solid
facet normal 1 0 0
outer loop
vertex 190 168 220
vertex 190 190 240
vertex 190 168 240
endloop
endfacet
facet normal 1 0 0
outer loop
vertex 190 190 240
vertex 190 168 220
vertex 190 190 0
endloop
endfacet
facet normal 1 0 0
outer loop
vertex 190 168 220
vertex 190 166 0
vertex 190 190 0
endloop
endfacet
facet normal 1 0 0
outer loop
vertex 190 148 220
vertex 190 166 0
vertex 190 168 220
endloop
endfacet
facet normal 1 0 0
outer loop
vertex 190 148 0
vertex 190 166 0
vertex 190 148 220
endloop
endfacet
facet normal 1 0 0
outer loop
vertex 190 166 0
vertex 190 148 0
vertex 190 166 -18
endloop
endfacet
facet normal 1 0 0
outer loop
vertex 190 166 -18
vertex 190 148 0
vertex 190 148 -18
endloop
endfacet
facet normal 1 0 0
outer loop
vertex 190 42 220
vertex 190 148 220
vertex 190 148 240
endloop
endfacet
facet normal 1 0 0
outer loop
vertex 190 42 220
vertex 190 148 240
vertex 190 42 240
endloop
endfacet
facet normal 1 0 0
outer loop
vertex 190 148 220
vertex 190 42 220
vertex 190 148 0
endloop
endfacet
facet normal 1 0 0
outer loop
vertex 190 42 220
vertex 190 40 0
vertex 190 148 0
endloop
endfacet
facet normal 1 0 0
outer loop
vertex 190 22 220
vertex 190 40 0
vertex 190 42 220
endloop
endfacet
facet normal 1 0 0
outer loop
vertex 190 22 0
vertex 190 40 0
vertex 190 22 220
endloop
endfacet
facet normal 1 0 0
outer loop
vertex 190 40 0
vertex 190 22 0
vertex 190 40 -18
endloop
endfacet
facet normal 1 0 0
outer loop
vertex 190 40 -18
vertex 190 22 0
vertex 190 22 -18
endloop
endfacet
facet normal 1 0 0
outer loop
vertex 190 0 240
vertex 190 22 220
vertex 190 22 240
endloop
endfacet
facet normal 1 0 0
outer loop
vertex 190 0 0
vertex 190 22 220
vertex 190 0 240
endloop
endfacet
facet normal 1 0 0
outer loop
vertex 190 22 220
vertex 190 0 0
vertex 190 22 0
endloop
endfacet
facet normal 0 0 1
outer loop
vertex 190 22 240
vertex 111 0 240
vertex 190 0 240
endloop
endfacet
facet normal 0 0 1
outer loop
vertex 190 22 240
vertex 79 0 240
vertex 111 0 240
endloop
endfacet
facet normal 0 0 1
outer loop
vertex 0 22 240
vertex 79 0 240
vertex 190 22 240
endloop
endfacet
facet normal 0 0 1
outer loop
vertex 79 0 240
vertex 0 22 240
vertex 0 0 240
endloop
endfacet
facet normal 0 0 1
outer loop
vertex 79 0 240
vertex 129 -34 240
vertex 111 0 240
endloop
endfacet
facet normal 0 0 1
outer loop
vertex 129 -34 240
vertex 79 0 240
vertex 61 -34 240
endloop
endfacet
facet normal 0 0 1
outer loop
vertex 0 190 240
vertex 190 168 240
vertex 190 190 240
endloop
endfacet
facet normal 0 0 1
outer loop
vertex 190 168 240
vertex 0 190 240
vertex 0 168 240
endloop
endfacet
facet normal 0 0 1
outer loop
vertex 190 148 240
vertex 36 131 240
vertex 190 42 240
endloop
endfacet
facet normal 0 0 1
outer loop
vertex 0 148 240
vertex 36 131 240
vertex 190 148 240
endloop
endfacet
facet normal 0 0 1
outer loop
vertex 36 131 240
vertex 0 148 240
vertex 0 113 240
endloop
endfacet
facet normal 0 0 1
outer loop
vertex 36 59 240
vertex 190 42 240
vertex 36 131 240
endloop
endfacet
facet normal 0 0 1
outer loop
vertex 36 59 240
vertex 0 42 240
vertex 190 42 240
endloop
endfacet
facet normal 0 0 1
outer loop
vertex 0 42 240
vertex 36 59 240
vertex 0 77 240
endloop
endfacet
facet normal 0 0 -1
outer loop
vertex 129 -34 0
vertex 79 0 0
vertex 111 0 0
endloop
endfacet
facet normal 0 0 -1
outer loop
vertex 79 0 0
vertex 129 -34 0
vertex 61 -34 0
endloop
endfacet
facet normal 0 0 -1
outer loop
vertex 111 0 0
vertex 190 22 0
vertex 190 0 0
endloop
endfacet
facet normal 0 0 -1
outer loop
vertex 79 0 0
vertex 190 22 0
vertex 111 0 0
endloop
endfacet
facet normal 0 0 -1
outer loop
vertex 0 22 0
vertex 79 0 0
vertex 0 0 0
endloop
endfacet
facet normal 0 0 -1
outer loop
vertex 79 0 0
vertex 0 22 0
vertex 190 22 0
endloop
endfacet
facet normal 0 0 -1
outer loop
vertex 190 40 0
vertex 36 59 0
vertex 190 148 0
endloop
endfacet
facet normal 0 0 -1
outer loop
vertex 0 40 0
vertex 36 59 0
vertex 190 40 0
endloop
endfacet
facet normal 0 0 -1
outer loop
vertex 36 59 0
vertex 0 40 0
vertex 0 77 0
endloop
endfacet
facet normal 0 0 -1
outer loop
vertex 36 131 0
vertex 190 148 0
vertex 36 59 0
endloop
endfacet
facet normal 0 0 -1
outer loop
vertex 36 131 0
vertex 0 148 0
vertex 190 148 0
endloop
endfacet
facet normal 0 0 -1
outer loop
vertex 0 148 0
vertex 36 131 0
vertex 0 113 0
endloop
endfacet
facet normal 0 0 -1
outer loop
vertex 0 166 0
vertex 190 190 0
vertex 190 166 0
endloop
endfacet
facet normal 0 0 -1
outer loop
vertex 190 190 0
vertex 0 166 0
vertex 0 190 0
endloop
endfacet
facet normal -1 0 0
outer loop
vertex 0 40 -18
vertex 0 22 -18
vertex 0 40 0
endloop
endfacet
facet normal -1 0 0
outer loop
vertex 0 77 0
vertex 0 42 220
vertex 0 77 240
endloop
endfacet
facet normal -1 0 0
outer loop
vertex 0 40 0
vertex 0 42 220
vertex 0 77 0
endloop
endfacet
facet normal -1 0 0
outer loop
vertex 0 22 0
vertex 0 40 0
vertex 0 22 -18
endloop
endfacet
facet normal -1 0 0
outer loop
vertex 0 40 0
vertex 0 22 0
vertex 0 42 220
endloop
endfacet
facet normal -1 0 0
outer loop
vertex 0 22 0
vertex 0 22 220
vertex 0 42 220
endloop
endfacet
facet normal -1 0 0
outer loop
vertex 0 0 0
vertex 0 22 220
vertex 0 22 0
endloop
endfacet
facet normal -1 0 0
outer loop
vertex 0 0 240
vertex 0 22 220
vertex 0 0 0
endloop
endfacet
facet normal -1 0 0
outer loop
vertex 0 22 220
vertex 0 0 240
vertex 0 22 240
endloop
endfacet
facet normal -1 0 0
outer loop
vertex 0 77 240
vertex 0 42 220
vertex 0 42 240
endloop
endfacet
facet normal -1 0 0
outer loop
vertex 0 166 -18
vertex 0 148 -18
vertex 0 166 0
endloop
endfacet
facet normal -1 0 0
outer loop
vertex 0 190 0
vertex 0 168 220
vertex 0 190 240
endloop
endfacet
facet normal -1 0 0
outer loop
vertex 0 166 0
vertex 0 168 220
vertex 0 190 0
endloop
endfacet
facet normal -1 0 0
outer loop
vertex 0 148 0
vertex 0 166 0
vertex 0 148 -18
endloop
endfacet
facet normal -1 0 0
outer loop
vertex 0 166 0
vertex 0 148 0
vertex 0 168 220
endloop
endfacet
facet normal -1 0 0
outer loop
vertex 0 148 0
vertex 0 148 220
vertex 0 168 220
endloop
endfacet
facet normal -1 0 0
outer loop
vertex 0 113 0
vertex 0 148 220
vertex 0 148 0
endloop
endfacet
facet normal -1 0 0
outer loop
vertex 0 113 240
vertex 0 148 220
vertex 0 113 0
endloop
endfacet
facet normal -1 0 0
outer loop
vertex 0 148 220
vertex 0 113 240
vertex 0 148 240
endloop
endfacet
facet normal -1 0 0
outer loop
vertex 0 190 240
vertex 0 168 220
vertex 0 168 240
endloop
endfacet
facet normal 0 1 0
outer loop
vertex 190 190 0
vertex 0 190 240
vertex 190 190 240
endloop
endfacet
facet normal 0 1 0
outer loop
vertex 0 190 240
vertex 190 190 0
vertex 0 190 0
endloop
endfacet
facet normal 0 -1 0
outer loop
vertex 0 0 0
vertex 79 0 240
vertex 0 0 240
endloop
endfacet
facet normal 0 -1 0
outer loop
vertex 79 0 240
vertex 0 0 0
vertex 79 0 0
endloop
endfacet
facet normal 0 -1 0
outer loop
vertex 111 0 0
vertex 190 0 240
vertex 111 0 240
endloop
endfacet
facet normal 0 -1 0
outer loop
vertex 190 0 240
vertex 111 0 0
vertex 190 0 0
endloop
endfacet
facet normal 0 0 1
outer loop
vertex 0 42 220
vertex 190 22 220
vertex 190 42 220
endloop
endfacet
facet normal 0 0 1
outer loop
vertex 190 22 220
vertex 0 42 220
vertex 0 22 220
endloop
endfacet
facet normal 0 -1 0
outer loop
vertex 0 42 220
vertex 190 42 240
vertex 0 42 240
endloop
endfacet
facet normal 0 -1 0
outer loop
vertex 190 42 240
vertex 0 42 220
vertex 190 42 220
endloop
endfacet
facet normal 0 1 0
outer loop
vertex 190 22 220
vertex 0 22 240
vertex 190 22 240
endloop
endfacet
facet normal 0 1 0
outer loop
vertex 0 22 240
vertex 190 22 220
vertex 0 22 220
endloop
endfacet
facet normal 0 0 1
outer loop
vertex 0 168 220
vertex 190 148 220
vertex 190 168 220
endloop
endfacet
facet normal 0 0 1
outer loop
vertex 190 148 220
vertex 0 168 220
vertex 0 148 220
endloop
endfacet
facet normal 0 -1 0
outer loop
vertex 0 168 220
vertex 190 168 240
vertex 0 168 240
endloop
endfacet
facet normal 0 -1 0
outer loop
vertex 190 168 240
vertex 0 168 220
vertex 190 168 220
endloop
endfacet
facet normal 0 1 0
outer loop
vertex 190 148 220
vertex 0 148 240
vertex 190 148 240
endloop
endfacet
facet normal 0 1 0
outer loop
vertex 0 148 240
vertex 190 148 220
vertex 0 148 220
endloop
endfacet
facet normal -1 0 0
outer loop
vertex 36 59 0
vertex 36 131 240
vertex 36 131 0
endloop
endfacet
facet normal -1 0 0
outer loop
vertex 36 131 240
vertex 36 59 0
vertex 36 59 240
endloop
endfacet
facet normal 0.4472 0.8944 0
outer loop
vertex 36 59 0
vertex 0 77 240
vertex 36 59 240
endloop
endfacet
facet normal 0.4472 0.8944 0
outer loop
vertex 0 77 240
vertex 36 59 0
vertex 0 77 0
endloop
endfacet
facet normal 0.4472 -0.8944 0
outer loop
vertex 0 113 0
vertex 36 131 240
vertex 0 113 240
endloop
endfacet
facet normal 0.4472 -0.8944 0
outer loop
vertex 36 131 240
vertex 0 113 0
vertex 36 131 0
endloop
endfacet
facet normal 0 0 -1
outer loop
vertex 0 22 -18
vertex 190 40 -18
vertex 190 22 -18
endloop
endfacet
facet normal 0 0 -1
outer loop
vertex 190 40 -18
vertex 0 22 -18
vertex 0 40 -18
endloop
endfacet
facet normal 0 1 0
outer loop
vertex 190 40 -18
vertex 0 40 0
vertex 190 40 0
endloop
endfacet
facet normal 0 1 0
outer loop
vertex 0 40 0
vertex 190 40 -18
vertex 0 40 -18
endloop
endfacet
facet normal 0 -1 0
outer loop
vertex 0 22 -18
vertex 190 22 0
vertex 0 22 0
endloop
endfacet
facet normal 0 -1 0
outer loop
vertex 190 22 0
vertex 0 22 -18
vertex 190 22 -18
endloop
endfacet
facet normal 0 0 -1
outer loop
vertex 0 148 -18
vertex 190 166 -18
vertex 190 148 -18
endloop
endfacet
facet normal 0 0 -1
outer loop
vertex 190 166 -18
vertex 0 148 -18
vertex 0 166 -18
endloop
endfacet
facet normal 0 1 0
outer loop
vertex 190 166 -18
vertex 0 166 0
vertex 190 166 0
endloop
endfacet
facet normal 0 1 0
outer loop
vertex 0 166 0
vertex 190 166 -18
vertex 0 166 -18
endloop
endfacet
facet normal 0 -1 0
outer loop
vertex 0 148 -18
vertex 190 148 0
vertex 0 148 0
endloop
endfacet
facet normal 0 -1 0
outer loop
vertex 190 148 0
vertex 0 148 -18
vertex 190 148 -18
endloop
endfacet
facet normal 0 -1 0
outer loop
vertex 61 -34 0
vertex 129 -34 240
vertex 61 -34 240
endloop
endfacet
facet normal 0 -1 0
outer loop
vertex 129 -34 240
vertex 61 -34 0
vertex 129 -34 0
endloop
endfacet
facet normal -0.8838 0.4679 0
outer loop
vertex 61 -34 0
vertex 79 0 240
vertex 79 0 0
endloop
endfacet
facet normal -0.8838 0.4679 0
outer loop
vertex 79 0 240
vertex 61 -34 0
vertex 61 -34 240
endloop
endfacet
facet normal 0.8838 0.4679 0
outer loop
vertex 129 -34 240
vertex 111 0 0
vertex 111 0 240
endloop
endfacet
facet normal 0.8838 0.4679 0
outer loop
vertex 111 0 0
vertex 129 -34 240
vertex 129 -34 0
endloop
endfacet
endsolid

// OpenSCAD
FULL_BLOCK_WIDTH = 380;
HALF_BLOCK_WIDTH = 190;
BLOCK_HEIGHT = 240;
SMALL_BLOCK_DEPTH = 120;
MEDIUM_BLOCK_DEPTH = HALF_BLOCK_WIDTH;
HORIZONTAL_JOINT_SIZE = 20;
HORIZONTAL_JOINT_PADDING = 22;
VERTICAL_JOINT_STEP = 18;
FITTING = 2;

module vertical_joint_outer(block_height, vertical_joint_step, fitting) {
    linear_extrude(block_height) {
        polygon(points = [[0,vertical_joint_step + fitting],[vertical_joint_step*2 - fitting,fitting],[vertical_joint_step*2 - fitting,vertical_joint_step*4 - fitting],[0,vertical_joint_step*3 - fitting]]);
    }
}

module vertical_joint_inner(block_height, vertical_joint_step) {
    linear_extrude(block_height) {
        polygon(points = [[0,vertical_joint_step],[vertical_joint_step*2,0],[vertical_joint_step*2,vertical_joint_step*4],[0,vertical_joint_step*3]]);
    }
}

module horizontal_joint_inner(block_width, horizontal_joint_size) {
    cube([block_width,horizontal_joint_size,horizontal_joint_size],false);
}

module horizontal_joint_outer(block_width, horizontal_joint_size, fitting) {
    cube([block_width,horizontal_joint_size - fitting,horizontal_joint_size - fitting],false);
}


module brick(block_width, block_height, block_depth, horizontal_joint_size, horizontal_joint_padding, vertical_joint_step, fitting, start_joint, end_joint, side_joint) {

    difference() {
        cube([block_width,block_depth,block_height],false);
            translate([0,horizontal_joint_padding,block_height - horizontal_joint_size]) {
                horizontal_joint_inner(block_width, horizontal_joint_size);
            }
           
            translate([0,block_depth - horizontal_joint_padding- horizontal_joint_size,block_height-horizontal_joint_size]) {
                horizontal_joint_inner(block_width, horizontal_joint_size);
            }
            
            if (start_joint) {
                translate([0,(block_depth - vertical_joint_step*4)/2,0]) {
                    vertical_joint_inner(block_height, vertical_joint_step);
                }
            }
    }

    translate([0,horizontal_joint_padding, fitting - horizontal_joint_size]) {
        horizontal_joint_outer(block_width,horizontal_joint_size, fitting);
    }

    translate([0,block_depth - horizontal_joint_padding- horizontal_joint_size,fitting -horizontal_joint_size]) {
        horizontal_joint_outer(block_width,horizontal_joint_size, fitting);
    }

    if (end_joint) {
        translate([block_width,(block_depth - vertical_joint_step*4)/2,0]) {
            vertical_joint_outer(block_height, vertical_joint_step, fitting);
        }
    }
    
    if (side_joint) {
        translate([block_width-(block_depth/2)-vertical_joint_step*2,0,0]) {
            rotate([0,0,-90]) {
                vertical_joint_outer(block_height, vertical_joint_step, fitting);
            }
        }
    }
}

module fullBrick() { 
    brick(FULL_BLOCK_WIDTH, BLOCK_HEIGHT, MEDIUM_BLOCK_DEPTH, HORIZONTAL_JOINT_SIZE,HORIZONTAL_JOINT_PADDING, VERTICAL_JOINT_STEP, FITTING, true, true, false);
}

module halfBrick() { 
    brick(HALF_BLOCK_WIDTH, BLOCK_HEIGHT, MEDIUM_BLOCK_DEPTH, HORIZONTAL_JOINT_SIZE,HORIZONTAL_JOINT_PADDING, VERTICAL_JOINT_STEP, FITTING, true, true, false);
}

module fullTurnBrick() {
    brick(FULL_BLOCK_WIDTH, BLOCK_HEIGHT, MEDIUM_BLOCK_DEPTH, HORIZONTAL_JOINT_SIZE,HORIZONTAL_JOINT_PADDING, VERTICAL_JOINT_STEP, FITTING, true, false, true);
}

module halfTurnBrick() {
    brick(HALF_BLOCK_WIDTH, BLOCK_HEIGHT, MEDIUM_BLOCK_DEPTH, HORIZONTAL_JOINT_SIZE,HORIZONTAL_JOINT_PADDING, VERTICAL_JOINT_STEP, FITTING, true, false, true);
}


//fullBrick();
//halfBrick();
//fullTurnBrick();
halfTurnBrick();
